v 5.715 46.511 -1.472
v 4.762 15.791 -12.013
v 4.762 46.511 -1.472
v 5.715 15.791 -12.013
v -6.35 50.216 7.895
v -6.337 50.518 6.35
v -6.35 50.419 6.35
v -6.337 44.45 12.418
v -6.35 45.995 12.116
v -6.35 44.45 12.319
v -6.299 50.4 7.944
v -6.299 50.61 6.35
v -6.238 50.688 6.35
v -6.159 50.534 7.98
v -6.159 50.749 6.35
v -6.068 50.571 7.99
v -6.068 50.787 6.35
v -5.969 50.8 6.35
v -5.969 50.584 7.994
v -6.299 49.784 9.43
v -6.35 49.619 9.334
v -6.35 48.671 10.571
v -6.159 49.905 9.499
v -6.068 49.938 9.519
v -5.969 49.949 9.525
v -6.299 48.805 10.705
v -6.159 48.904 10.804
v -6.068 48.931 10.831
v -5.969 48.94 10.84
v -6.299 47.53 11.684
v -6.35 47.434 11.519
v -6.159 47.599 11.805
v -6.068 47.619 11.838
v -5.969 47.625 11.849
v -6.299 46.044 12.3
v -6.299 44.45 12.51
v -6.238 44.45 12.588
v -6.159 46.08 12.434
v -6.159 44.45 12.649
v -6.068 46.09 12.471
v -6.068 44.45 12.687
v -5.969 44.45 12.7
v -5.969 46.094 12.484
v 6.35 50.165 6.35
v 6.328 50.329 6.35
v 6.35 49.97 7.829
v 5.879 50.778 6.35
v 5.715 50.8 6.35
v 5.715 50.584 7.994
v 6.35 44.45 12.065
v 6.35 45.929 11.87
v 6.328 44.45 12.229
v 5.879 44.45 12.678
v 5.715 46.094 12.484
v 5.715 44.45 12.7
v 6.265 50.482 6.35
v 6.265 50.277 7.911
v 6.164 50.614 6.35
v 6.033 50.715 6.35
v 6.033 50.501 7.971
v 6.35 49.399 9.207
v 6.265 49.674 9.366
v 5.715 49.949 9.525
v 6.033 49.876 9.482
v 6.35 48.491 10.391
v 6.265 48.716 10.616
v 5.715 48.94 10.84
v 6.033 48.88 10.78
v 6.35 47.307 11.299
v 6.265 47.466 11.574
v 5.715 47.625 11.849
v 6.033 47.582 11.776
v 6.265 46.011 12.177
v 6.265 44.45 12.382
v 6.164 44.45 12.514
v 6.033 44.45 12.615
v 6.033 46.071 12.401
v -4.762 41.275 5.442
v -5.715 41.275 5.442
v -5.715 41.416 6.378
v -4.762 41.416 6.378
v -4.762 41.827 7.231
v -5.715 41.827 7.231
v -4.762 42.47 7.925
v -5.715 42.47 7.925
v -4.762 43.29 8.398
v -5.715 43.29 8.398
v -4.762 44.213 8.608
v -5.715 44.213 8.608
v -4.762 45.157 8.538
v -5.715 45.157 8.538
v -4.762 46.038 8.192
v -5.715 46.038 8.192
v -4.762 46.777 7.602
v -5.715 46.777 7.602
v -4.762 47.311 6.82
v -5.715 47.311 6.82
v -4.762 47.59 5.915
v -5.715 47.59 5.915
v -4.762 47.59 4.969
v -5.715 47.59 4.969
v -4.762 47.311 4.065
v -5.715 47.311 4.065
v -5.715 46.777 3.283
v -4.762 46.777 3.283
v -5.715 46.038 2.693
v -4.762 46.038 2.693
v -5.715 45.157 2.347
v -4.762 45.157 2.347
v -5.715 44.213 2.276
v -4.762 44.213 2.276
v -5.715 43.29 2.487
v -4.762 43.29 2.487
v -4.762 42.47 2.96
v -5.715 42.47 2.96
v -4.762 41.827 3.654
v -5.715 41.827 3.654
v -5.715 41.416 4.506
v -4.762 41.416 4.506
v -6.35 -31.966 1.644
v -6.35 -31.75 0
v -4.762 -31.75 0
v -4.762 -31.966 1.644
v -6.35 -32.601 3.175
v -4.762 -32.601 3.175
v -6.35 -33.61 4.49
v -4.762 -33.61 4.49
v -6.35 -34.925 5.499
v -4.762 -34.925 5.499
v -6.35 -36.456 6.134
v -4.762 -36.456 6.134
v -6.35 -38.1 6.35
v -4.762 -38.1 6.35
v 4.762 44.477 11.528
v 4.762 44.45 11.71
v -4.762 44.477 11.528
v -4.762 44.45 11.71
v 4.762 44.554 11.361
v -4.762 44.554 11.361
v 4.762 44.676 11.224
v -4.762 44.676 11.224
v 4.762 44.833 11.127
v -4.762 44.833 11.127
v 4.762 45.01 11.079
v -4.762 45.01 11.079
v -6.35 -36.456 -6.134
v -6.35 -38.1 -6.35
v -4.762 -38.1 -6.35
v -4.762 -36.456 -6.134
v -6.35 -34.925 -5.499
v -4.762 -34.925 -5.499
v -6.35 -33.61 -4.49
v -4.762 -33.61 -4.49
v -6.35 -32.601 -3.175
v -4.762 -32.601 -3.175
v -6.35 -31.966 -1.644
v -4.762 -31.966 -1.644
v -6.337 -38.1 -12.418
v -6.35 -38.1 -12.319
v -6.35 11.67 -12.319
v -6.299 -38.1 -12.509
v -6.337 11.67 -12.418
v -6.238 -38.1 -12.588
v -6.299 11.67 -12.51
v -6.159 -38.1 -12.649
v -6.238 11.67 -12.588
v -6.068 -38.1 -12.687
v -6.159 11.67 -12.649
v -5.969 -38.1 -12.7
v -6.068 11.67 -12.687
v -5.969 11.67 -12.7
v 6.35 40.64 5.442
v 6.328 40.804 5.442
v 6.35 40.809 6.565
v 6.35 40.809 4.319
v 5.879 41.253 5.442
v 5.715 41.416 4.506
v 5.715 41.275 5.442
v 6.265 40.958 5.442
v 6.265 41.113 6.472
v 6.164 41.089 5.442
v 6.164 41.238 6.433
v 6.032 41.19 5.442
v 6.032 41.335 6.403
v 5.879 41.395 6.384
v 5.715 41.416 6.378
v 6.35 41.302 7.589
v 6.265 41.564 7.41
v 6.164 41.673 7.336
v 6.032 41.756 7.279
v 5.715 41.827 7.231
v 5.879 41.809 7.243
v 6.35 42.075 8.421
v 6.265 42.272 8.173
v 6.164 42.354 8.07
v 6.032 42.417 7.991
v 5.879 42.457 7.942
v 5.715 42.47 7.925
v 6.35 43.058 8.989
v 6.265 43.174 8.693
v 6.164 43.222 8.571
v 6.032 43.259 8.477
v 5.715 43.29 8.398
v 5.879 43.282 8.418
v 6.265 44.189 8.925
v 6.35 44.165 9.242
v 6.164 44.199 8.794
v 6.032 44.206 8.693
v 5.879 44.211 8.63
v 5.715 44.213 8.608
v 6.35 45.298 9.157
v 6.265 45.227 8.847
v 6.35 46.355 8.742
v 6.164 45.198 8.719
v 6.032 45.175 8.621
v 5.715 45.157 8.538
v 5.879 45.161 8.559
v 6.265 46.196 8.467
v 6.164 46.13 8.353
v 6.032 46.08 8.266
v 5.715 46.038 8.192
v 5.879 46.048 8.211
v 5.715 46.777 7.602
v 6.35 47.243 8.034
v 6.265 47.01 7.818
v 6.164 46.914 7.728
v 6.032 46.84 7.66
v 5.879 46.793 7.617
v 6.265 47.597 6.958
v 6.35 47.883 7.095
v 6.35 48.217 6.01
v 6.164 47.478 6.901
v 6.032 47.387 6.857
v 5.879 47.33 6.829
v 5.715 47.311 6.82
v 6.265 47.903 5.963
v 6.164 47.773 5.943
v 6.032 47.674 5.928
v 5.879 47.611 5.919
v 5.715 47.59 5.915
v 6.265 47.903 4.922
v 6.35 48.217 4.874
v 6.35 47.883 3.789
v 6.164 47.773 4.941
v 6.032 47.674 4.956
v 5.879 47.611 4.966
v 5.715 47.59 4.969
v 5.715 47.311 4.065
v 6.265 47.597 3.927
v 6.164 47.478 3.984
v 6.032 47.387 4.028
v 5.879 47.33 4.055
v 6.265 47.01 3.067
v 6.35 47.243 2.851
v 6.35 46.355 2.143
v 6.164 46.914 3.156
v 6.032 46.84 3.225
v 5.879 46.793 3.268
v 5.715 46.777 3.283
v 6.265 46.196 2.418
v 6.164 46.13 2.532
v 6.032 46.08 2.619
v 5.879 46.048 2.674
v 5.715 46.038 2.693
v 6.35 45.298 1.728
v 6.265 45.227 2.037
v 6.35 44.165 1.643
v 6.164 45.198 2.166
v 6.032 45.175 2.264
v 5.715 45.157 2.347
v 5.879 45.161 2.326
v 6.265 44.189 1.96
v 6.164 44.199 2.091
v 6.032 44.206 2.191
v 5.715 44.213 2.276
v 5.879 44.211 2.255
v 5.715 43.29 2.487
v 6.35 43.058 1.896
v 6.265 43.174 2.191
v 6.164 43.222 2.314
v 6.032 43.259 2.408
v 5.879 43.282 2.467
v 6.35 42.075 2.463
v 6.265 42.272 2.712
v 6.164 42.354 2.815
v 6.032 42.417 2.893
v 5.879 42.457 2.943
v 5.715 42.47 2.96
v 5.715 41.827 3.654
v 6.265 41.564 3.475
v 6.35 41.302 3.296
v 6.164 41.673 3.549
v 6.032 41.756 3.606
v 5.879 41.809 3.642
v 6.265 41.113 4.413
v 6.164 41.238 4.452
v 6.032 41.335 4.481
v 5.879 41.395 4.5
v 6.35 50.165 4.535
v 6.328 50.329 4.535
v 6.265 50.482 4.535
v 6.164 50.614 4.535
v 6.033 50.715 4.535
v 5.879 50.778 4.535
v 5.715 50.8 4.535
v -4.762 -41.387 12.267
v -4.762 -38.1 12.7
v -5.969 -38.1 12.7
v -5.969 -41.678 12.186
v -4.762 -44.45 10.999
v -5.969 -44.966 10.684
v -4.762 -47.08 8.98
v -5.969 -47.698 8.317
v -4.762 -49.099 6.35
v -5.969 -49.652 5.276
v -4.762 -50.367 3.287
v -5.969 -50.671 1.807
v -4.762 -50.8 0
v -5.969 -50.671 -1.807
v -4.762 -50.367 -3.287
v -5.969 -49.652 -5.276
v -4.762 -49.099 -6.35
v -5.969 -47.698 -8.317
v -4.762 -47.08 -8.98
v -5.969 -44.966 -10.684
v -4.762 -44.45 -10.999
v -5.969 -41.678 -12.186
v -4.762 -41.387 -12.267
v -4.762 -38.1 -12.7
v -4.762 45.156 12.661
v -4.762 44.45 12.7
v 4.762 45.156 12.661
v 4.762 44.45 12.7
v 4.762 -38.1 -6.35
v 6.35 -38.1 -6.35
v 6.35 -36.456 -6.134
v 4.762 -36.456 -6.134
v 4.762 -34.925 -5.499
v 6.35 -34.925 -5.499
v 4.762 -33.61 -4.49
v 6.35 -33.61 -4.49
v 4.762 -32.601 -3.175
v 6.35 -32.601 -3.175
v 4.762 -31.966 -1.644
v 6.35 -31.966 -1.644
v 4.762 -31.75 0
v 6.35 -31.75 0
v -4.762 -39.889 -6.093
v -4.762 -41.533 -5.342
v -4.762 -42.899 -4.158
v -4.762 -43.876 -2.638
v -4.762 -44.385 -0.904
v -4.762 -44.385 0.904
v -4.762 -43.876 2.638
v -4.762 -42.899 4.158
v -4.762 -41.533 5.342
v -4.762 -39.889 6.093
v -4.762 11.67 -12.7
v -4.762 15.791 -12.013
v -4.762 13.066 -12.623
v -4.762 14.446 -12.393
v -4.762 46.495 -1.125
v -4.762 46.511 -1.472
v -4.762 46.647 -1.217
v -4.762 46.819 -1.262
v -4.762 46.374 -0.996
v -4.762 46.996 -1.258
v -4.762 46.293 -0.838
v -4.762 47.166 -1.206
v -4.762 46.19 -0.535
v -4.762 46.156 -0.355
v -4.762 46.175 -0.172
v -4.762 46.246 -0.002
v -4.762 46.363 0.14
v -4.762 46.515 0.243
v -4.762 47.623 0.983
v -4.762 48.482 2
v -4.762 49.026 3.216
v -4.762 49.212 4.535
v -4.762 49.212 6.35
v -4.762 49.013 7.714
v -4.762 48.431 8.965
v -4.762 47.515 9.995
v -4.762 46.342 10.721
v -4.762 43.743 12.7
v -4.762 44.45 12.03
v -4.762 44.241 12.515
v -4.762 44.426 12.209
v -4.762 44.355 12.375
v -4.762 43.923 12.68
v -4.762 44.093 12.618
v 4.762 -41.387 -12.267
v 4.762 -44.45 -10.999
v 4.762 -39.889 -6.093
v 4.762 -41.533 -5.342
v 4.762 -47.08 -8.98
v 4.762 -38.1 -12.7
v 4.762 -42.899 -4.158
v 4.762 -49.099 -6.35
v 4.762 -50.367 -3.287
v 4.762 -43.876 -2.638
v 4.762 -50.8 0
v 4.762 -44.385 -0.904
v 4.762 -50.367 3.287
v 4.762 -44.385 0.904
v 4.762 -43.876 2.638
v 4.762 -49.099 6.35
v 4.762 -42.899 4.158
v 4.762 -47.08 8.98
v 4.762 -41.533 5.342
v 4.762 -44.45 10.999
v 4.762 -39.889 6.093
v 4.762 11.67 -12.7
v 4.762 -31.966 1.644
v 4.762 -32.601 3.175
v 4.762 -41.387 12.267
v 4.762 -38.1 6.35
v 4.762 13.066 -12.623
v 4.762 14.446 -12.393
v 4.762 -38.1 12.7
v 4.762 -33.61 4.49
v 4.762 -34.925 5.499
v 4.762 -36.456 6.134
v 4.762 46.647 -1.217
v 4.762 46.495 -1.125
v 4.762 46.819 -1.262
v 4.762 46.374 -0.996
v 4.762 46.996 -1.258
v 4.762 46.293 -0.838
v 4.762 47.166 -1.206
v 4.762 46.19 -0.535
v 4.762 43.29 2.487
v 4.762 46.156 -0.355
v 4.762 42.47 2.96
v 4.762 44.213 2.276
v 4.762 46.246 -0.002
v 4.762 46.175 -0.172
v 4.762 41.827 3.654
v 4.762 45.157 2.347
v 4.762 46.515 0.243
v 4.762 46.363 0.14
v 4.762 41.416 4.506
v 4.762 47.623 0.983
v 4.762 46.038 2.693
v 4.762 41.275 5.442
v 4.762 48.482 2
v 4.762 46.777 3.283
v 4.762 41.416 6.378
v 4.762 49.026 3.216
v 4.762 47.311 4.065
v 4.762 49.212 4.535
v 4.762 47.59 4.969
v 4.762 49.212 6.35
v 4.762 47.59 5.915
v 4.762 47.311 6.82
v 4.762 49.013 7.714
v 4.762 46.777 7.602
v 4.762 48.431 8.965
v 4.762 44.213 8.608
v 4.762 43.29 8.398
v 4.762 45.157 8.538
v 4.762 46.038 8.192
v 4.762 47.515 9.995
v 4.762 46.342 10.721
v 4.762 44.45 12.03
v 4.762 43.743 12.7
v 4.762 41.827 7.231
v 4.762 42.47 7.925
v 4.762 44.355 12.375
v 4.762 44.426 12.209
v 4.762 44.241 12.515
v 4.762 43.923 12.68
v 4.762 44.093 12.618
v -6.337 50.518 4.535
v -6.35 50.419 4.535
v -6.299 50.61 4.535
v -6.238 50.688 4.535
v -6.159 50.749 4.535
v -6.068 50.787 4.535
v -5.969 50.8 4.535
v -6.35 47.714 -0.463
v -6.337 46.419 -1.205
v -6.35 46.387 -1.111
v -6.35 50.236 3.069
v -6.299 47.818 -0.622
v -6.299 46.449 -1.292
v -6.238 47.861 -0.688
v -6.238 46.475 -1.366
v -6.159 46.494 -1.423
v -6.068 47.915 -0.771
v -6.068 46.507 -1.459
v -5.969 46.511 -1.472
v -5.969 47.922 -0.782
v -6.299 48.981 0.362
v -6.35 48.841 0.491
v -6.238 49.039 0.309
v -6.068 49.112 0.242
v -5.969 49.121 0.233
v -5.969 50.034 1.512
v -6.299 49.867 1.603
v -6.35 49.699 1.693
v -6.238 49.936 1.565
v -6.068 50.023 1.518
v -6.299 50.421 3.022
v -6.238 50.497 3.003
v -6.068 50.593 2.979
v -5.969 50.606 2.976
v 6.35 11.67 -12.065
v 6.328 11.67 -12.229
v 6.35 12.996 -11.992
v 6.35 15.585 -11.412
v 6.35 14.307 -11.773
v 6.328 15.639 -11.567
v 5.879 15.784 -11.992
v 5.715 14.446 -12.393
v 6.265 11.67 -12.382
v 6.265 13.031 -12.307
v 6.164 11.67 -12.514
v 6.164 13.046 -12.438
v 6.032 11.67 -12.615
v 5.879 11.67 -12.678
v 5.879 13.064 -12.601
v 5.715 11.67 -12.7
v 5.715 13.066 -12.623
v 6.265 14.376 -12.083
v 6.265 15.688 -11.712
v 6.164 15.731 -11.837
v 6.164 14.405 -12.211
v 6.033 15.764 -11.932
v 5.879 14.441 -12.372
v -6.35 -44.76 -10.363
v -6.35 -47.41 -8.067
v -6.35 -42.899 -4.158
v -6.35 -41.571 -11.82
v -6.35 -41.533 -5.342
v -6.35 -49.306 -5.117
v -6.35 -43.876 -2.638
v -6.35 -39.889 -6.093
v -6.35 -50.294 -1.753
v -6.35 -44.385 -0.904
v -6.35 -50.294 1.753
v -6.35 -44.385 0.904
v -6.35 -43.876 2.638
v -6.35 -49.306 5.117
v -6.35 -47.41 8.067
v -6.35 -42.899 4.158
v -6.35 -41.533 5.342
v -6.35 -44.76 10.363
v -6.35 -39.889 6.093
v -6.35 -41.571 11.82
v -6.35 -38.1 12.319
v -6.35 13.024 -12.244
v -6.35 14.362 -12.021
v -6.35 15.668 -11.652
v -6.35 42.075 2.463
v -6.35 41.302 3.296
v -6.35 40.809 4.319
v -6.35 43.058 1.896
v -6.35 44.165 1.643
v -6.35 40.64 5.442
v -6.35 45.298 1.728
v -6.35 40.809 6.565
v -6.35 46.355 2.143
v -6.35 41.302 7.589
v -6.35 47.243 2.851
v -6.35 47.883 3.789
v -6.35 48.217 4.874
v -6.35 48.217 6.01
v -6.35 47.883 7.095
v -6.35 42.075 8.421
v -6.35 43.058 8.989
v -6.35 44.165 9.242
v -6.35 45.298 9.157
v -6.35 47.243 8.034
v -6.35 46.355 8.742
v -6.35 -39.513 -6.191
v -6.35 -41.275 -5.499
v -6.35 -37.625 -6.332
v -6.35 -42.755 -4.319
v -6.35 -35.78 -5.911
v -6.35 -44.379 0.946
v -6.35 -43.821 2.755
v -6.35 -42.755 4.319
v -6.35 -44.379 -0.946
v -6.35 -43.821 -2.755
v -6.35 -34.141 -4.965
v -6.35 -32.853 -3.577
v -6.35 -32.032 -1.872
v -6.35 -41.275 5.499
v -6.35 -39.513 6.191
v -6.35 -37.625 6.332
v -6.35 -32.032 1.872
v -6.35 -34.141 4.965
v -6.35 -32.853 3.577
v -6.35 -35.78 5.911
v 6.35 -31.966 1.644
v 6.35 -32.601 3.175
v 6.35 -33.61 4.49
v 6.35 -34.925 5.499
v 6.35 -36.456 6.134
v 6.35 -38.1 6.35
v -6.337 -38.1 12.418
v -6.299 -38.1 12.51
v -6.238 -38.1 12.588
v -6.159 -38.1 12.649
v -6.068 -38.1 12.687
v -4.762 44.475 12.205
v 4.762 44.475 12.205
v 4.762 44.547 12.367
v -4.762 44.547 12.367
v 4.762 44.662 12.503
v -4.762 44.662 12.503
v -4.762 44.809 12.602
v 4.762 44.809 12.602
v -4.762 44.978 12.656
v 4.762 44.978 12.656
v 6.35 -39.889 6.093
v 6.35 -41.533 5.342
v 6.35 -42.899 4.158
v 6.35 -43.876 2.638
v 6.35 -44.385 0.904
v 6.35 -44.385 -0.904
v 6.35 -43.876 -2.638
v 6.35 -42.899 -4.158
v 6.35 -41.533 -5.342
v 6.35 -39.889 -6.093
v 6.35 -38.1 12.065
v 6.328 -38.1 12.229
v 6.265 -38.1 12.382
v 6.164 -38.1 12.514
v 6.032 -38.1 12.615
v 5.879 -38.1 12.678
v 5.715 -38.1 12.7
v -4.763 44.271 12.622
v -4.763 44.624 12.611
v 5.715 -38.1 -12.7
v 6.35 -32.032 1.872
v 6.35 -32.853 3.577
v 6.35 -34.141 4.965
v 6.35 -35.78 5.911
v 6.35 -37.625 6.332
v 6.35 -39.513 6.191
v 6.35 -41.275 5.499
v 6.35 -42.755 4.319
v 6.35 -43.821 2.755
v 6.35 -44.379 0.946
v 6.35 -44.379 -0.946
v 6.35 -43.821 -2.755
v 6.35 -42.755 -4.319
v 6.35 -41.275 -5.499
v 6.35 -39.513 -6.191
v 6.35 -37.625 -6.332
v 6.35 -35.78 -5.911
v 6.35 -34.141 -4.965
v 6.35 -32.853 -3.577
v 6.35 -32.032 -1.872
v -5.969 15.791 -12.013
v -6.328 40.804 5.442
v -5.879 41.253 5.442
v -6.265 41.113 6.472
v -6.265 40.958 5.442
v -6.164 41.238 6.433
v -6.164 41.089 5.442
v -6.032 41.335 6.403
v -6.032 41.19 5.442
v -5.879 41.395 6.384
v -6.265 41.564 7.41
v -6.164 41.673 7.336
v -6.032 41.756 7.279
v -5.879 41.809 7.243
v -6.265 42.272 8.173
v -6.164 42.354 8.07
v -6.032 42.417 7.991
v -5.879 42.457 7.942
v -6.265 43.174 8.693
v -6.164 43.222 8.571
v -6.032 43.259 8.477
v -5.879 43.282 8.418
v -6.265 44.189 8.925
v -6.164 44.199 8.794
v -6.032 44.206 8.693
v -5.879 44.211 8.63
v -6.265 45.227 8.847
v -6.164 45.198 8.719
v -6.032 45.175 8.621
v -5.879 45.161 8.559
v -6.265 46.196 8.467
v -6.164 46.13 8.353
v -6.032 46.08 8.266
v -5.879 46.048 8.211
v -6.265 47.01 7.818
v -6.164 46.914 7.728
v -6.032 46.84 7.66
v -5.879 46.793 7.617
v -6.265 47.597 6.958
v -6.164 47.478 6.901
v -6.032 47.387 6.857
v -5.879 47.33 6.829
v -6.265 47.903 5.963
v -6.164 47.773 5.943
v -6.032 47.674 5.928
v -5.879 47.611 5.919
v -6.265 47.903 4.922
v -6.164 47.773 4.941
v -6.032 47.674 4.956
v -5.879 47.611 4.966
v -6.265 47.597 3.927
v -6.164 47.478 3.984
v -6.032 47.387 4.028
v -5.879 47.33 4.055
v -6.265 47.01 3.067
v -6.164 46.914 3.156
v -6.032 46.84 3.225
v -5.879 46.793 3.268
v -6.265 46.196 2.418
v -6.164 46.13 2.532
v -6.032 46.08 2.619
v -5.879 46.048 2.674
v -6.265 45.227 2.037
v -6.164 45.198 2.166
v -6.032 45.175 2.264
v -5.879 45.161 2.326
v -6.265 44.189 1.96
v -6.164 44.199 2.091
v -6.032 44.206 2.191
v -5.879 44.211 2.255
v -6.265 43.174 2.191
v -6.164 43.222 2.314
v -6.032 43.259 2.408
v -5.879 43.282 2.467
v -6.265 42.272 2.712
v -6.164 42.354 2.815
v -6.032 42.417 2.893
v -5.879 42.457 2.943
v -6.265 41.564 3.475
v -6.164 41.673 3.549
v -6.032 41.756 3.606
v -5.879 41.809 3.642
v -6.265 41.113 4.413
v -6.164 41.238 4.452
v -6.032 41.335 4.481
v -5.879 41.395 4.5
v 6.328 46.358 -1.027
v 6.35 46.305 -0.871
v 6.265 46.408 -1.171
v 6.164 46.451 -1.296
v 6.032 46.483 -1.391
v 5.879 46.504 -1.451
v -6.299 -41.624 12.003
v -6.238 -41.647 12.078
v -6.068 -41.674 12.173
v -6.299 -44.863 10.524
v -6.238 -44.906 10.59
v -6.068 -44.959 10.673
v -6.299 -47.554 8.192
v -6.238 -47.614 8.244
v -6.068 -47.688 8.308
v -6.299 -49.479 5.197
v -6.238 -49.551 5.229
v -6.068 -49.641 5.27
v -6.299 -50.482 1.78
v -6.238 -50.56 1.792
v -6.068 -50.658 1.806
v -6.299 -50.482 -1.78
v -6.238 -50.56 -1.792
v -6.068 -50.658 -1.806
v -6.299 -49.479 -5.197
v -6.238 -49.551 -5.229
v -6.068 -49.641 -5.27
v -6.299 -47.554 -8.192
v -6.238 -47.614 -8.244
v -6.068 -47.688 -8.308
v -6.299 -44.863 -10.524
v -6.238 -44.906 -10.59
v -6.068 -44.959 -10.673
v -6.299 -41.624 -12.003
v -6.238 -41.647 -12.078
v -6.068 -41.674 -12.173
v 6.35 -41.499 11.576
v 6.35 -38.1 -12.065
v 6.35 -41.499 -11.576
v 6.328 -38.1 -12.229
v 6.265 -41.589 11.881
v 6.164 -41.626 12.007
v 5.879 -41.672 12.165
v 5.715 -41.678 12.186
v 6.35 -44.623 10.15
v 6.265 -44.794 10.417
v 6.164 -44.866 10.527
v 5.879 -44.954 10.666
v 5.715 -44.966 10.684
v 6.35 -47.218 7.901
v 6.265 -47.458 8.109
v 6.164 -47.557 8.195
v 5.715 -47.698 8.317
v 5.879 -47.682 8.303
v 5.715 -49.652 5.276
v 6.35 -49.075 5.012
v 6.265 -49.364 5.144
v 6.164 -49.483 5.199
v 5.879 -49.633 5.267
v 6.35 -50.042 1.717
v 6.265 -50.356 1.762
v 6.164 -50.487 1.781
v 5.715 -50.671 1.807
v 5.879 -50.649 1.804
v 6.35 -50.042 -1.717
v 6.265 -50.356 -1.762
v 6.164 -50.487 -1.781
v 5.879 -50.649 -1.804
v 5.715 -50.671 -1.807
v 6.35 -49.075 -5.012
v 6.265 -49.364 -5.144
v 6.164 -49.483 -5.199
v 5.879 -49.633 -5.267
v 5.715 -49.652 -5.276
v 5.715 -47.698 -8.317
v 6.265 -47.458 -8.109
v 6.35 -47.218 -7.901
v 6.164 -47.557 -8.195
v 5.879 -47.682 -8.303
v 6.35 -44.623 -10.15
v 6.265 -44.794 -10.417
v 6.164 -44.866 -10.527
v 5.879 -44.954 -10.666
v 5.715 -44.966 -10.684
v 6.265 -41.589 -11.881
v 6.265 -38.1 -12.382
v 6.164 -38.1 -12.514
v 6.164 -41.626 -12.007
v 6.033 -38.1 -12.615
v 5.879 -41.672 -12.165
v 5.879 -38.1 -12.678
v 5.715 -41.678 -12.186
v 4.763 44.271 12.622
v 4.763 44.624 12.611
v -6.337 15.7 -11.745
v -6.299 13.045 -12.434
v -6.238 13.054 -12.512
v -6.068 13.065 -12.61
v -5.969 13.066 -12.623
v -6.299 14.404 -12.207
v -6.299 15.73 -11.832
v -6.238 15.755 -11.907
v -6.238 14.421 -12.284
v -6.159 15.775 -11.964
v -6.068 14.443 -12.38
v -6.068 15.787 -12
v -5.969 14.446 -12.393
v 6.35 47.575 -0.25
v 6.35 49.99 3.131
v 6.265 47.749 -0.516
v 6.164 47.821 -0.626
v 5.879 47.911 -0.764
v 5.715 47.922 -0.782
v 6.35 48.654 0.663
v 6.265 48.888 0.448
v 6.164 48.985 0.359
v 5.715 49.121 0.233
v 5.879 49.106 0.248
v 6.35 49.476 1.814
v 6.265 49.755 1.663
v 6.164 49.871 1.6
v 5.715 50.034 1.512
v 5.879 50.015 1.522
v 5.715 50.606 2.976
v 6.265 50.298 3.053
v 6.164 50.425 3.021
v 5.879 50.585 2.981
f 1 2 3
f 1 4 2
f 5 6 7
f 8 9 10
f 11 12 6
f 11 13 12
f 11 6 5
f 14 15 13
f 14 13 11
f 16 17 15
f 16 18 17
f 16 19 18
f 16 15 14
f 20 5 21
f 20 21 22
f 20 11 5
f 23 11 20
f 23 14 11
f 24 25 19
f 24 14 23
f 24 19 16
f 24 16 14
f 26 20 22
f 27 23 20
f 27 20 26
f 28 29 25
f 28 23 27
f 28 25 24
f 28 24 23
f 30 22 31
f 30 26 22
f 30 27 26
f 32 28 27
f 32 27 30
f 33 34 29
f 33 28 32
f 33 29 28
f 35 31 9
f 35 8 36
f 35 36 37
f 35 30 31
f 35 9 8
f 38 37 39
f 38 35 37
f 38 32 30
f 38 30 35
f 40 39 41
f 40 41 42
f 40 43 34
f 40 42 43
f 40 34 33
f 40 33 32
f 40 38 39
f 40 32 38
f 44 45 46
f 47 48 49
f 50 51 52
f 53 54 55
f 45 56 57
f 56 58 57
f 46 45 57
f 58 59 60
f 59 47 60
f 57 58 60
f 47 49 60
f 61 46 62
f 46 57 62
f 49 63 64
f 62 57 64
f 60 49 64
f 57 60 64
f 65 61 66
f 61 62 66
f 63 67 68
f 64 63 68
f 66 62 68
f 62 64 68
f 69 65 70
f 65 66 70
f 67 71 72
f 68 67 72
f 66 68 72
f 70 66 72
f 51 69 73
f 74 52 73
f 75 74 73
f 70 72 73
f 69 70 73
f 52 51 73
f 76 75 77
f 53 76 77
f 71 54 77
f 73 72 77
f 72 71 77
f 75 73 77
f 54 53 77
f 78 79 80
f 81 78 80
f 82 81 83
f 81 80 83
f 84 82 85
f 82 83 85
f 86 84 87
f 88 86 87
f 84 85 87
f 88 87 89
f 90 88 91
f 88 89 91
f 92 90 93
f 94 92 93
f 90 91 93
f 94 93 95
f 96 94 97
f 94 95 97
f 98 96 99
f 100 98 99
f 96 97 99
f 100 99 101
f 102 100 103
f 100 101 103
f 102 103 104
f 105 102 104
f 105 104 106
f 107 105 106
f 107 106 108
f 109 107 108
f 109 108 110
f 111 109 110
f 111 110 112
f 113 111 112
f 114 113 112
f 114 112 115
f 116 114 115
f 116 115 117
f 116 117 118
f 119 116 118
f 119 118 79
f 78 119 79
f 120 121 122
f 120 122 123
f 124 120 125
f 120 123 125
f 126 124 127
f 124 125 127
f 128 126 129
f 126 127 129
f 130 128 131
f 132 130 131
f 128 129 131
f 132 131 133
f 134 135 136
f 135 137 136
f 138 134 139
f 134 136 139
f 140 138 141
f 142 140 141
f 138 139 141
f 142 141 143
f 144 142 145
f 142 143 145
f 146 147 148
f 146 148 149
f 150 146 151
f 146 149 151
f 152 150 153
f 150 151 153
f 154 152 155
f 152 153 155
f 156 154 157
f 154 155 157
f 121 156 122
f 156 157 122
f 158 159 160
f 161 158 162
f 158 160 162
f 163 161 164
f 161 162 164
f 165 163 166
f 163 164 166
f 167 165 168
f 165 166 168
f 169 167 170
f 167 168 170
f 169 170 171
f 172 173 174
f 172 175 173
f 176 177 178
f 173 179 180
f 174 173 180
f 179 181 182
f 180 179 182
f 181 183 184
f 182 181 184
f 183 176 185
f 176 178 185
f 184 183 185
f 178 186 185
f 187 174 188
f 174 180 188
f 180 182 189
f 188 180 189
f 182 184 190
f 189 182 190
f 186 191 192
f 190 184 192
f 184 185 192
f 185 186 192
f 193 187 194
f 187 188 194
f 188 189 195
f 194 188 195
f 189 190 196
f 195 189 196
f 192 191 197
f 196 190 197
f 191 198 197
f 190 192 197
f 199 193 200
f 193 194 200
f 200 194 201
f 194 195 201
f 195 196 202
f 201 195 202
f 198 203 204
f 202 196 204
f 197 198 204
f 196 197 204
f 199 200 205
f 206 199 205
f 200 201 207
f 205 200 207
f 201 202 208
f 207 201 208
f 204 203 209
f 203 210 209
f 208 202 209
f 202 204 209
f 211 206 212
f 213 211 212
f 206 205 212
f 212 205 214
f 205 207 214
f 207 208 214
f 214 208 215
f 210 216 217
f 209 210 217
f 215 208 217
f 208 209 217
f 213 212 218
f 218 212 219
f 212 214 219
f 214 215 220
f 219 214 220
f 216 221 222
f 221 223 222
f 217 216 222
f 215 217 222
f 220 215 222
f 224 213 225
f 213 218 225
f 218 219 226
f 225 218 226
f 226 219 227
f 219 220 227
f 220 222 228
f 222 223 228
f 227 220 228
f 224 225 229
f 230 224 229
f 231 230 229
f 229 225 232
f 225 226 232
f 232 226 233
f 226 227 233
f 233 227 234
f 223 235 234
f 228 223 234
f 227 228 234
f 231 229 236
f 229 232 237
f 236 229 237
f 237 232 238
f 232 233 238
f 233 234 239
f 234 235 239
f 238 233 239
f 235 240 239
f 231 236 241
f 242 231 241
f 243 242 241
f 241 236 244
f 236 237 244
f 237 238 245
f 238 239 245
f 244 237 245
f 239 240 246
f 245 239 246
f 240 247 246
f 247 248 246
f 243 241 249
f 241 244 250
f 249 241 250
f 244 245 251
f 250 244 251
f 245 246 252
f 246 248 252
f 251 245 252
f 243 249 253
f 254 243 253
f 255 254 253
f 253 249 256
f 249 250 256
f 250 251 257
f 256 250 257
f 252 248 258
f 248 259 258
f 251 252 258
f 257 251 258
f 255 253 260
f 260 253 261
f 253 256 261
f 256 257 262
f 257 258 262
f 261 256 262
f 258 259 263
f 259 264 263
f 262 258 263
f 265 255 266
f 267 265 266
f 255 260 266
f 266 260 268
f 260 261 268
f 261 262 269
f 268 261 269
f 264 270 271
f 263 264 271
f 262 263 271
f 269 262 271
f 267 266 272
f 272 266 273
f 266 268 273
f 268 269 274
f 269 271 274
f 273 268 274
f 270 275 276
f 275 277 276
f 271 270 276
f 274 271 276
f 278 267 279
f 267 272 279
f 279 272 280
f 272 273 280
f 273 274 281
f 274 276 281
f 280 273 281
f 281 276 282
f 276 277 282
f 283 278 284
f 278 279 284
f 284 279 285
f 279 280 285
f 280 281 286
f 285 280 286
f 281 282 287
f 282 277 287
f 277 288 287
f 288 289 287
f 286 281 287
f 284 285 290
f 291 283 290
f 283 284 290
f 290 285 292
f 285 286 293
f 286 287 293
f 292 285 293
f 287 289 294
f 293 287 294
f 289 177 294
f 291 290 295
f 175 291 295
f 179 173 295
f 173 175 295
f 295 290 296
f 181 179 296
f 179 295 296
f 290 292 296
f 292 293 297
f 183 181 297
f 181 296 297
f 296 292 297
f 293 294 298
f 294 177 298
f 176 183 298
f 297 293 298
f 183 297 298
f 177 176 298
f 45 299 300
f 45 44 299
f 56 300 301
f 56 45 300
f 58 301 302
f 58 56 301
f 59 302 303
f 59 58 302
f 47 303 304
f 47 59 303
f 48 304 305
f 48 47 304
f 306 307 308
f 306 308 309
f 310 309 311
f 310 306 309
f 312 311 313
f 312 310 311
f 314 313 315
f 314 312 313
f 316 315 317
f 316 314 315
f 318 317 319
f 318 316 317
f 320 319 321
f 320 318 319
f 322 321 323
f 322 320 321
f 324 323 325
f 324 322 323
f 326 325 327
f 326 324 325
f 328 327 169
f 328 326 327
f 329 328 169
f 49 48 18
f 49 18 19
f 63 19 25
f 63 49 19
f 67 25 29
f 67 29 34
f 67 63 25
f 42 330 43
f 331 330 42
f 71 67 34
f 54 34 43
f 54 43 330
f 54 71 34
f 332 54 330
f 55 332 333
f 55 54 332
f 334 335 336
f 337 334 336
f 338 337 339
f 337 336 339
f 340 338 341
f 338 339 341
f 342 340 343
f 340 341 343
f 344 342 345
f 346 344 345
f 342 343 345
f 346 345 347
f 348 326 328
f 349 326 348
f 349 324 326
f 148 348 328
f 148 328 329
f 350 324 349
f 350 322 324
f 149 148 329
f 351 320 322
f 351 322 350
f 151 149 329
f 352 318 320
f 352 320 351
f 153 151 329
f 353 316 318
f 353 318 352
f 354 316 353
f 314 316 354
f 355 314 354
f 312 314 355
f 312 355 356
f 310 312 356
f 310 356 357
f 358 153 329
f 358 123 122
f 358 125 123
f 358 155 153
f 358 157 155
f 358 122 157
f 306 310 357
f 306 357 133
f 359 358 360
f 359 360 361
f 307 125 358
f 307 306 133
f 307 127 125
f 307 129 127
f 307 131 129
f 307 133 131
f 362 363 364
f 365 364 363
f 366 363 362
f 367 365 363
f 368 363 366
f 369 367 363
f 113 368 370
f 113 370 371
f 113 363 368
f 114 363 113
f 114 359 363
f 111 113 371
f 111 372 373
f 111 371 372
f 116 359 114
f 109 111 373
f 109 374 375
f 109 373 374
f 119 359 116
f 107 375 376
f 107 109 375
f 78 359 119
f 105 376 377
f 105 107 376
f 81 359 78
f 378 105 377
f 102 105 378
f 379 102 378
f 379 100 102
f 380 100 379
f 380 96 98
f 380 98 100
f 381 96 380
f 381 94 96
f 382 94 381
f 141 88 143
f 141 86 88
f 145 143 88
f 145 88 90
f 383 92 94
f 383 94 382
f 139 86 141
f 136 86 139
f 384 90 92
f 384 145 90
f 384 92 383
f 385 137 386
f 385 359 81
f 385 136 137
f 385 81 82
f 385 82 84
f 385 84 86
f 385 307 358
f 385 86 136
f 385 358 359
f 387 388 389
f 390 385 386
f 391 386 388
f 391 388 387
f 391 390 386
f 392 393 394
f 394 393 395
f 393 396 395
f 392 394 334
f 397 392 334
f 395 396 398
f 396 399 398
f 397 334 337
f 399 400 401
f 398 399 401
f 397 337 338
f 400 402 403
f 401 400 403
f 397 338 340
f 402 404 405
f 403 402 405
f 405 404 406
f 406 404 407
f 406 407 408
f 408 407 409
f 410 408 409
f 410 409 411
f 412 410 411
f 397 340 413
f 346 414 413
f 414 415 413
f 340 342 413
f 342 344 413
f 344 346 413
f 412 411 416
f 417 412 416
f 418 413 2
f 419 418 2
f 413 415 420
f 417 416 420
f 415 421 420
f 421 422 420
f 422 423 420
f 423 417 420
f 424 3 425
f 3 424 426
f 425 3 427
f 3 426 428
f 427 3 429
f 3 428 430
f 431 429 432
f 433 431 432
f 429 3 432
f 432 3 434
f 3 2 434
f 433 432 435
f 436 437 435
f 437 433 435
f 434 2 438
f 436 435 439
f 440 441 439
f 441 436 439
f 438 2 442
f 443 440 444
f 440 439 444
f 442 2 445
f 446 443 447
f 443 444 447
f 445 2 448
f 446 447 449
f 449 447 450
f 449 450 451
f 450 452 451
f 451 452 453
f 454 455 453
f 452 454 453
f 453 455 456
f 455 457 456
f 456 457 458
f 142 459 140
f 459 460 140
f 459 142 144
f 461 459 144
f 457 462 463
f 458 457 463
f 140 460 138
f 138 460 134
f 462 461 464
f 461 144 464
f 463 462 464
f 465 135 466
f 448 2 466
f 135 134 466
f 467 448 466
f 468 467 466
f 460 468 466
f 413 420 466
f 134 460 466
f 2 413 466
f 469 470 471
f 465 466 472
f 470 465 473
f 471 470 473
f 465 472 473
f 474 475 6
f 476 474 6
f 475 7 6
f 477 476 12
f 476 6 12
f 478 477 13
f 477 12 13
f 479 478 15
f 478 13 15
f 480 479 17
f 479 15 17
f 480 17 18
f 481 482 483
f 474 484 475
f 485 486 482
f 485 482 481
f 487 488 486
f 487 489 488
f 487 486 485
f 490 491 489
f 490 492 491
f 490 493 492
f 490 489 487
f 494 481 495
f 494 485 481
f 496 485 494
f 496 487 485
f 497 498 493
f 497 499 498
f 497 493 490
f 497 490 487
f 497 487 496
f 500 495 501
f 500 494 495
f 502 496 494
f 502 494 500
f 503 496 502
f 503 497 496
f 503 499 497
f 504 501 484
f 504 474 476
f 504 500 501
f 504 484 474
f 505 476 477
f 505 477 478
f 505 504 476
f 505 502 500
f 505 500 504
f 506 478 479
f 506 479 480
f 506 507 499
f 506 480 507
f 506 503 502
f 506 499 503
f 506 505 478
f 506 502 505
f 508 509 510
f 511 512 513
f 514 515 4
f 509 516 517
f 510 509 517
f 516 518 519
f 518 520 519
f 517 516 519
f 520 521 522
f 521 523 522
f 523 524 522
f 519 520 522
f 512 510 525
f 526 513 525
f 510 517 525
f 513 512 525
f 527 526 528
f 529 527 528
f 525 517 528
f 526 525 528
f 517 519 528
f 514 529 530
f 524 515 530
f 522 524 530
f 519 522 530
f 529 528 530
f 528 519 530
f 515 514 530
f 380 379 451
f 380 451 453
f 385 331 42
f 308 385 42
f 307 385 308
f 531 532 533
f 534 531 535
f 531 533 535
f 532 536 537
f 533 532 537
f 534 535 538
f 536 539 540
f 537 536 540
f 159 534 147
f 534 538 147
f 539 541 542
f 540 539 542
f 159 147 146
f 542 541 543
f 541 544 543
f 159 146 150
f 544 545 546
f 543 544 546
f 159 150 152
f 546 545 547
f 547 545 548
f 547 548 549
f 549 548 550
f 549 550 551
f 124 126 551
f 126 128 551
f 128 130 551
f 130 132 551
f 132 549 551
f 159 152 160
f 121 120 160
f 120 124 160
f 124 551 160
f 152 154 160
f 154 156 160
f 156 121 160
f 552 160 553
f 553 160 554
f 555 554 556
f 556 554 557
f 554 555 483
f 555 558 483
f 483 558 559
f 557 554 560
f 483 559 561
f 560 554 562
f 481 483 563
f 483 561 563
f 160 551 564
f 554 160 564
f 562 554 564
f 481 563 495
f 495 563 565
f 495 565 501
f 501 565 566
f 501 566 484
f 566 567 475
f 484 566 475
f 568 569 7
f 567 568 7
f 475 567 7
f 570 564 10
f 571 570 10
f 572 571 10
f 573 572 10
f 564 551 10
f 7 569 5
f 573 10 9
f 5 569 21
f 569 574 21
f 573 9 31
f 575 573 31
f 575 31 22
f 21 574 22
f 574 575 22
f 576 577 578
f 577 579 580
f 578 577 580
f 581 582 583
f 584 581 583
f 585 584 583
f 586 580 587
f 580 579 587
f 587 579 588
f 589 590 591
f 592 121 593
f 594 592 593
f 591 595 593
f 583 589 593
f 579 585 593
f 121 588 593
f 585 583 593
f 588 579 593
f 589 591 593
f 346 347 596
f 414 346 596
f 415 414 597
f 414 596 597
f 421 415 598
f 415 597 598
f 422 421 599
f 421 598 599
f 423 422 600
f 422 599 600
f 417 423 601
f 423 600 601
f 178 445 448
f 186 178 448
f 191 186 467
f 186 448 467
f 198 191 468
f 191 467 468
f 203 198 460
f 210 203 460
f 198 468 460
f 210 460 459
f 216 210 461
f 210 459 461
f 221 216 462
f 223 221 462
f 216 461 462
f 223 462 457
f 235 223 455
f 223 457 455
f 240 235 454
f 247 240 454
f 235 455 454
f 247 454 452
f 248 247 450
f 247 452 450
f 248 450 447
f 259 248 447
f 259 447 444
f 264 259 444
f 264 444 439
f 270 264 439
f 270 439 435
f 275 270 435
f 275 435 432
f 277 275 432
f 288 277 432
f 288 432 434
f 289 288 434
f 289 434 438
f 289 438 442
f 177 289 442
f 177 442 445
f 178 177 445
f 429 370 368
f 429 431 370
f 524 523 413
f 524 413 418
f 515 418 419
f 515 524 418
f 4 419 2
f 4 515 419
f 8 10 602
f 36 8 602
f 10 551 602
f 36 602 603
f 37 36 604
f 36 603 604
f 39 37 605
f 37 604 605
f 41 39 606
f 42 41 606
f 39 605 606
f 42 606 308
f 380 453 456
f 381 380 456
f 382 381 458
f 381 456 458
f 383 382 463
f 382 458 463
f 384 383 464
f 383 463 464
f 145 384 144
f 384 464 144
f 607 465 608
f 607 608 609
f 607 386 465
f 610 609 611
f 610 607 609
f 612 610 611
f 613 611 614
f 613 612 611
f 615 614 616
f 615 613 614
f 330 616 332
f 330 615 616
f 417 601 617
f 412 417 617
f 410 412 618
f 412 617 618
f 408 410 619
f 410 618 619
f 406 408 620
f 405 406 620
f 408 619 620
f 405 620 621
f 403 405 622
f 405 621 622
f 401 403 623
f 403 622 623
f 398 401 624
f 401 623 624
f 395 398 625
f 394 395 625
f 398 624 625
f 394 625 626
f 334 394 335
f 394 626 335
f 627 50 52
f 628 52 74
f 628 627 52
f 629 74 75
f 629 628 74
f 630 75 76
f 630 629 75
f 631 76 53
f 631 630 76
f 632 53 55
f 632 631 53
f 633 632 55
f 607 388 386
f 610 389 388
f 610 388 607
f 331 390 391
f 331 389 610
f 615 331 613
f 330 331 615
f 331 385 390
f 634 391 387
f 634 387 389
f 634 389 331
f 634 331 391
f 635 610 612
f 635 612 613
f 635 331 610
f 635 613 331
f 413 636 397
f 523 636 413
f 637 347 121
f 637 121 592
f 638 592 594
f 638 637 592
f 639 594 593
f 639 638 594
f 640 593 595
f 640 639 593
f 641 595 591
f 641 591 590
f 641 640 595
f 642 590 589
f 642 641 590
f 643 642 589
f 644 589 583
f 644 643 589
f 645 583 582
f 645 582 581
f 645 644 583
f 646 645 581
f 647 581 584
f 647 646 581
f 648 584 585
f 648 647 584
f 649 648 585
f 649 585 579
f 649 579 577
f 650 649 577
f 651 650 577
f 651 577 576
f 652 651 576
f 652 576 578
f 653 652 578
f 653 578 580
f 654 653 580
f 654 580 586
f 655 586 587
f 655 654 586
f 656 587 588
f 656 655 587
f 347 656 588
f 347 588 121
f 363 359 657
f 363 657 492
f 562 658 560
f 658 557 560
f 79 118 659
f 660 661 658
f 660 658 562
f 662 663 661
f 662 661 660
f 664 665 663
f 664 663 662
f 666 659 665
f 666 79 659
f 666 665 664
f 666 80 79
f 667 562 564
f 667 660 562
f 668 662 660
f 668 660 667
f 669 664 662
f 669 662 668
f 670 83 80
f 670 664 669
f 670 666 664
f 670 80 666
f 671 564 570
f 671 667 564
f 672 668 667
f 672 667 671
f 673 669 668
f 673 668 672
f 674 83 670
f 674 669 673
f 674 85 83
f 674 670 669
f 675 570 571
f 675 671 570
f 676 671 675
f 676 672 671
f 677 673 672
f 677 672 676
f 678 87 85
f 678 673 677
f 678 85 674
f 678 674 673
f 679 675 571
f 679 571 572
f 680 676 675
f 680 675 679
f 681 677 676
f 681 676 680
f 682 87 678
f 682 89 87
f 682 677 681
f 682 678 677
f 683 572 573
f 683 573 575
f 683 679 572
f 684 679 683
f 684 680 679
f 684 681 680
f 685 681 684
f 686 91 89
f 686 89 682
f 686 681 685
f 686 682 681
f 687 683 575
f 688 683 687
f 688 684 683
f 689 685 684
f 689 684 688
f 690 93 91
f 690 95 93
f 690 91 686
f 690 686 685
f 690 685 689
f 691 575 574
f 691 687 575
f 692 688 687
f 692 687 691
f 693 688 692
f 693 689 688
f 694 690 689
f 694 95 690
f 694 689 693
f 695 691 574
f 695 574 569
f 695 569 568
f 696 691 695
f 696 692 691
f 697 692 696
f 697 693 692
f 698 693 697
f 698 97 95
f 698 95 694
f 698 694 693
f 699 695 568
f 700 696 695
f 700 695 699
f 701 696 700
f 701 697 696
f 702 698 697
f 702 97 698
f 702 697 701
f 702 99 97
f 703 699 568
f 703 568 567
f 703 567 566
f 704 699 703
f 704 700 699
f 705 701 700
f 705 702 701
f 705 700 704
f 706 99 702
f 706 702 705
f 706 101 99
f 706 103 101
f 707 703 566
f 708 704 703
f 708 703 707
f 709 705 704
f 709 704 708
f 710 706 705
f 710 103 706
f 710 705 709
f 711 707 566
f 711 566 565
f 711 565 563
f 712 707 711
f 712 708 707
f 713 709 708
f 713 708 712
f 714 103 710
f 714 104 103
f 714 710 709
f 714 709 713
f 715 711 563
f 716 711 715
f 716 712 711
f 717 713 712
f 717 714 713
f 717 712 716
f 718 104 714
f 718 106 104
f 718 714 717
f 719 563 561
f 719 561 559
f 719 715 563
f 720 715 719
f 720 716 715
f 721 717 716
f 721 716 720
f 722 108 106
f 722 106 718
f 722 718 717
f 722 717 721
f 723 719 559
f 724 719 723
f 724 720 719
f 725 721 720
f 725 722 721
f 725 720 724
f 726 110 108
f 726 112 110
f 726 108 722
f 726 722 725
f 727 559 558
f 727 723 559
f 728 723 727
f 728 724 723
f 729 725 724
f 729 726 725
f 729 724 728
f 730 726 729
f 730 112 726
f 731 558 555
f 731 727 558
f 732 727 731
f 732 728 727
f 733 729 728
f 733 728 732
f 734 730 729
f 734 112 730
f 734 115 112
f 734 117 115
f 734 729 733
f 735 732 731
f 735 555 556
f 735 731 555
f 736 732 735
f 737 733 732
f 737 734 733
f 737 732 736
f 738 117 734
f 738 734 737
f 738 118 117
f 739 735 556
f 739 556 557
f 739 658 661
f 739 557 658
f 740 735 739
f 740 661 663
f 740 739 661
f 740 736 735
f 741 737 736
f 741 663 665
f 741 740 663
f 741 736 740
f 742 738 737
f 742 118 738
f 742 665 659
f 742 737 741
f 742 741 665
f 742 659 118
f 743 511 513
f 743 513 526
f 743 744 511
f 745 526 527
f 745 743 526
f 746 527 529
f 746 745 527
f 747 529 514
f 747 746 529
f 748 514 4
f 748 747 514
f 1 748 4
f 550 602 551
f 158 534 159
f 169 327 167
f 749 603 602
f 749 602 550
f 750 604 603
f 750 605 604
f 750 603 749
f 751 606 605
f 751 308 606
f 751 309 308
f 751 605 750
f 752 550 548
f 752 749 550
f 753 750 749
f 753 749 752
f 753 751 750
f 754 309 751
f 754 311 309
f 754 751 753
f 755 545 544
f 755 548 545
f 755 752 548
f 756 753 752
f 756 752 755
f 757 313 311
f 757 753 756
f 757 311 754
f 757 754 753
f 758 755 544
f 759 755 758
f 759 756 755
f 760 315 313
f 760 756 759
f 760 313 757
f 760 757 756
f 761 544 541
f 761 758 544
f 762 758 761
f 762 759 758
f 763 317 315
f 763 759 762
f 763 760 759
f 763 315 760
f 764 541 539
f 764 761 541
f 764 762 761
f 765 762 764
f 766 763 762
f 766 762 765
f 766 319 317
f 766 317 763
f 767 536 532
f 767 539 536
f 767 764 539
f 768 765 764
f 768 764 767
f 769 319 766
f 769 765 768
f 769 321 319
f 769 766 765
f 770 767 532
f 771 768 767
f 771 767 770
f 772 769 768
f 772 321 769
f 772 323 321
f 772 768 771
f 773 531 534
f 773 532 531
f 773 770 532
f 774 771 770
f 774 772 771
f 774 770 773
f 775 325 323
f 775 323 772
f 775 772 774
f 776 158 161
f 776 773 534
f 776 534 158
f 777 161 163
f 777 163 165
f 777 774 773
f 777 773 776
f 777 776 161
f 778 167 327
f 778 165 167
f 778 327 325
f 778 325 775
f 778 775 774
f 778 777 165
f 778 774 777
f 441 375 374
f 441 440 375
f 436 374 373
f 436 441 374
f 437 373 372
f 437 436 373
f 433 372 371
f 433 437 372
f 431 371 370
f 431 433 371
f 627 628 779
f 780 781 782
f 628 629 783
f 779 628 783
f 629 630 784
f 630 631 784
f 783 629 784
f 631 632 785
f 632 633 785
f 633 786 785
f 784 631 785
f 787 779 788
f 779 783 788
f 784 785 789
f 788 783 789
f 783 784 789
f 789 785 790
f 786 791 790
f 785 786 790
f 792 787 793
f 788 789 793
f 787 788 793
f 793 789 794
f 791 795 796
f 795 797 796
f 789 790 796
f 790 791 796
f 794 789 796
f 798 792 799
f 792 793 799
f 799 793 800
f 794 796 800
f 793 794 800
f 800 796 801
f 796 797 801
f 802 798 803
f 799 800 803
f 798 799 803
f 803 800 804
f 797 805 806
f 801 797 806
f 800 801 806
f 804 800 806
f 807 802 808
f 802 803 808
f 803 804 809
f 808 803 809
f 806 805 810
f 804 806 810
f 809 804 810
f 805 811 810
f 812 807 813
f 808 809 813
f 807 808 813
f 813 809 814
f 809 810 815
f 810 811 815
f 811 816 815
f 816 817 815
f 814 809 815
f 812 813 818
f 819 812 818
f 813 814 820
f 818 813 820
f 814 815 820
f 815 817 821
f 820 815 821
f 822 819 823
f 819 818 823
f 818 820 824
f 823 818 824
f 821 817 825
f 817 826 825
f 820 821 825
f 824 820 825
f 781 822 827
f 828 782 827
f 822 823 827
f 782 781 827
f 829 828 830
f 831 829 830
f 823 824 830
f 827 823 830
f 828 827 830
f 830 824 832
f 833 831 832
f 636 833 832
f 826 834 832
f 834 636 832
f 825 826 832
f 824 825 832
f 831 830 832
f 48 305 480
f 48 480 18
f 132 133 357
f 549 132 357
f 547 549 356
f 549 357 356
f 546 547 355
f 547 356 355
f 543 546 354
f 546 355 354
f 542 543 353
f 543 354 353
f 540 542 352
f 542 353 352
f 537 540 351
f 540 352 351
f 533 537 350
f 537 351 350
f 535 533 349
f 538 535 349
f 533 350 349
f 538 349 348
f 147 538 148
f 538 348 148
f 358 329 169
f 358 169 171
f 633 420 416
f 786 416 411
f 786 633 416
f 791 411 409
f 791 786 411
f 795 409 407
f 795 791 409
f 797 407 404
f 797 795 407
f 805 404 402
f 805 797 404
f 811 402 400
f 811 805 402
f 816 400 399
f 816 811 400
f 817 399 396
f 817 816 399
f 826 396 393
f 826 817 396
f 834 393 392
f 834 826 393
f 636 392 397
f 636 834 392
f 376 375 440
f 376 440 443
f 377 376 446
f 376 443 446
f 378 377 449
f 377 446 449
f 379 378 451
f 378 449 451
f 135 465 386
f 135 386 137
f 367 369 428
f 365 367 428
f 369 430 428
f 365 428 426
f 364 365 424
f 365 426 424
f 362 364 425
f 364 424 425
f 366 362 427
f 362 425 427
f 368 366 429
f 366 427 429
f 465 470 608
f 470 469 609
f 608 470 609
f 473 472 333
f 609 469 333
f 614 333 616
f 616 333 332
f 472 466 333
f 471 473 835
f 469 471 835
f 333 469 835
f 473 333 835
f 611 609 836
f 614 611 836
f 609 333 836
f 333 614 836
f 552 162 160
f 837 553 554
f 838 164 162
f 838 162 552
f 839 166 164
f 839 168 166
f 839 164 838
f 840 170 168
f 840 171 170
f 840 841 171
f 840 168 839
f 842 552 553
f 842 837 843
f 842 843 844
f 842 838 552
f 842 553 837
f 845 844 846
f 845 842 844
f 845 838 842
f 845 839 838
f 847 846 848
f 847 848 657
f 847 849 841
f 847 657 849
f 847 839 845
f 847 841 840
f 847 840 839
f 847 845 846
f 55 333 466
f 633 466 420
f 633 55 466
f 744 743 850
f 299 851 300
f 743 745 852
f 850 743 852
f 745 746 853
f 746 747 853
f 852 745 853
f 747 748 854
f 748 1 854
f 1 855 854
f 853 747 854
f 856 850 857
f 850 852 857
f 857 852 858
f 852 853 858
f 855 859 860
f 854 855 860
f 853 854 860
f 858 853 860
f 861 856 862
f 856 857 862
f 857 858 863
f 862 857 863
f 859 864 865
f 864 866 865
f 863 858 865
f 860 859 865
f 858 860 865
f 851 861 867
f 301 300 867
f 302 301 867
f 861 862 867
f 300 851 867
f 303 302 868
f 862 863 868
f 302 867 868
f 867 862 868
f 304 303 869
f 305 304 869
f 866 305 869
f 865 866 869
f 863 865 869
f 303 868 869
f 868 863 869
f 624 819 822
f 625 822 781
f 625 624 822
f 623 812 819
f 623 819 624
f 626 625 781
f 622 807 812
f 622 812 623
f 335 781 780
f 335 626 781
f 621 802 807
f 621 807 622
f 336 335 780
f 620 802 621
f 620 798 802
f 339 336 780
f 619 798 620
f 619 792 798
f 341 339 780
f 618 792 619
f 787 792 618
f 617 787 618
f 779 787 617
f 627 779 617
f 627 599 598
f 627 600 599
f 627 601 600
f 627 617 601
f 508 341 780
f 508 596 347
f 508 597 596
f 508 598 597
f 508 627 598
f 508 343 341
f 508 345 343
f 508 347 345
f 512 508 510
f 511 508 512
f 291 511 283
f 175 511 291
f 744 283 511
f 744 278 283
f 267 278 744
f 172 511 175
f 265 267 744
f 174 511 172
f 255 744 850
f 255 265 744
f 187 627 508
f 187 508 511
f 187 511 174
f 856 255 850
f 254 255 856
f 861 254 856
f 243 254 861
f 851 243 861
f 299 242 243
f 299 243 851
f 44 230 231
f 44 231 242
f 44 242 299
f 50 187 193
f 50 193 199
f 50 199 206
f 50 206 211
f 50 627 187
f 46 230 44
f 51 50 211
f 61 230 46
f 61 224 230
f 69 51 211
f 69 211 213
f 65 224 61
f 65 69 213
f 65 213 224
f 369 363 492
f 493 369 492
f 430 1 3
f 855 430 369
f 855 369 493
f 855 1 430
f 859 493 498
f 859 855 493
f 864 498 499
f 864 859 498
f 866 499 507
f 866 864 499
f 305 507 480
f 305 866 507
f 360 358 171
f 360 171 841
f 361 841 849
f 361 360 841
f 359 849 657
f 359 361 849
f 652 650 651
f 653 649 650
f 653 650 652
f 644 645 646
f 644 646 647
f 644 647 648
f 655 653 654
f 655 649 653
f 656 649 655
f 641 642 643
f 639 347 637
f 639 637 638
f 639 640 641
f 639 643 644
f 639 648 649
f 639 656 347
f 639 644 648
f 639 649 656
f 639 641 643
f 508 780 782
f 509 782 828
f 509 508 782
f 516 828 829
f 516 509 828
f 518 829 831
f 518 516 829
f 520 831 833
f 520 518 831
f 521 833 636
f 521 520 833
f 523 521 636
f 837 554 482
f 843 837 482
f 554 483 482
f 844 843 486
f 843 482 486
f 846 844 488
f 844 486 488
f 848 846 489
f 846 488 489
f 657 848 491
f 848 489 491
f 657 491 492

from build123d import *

# Parameters (mm, degrees)
F1_DEPTH  = 6.35
F2_T      = 1.5875
F3_R      = 3.175
F4_DEPTH  = 25.4
F5_R      = 0.635
F6_R      = 0.381
F7_F1_R   = 0.635
F7_F2_R   = 0.635
F7_F3_R   = 0.635
F7_F4_R   = 0.635
F7_F5_R   = 0.635
F9_DEPTH  = 25.4
F10_R     = 6.35
F11_DEPTH = 12.7


# Not quite as in the source:
# - a shell that OpenCascade refuses in one call is made with other operations: the cavity is built on its own and cut out


with BuildPart() as f1:
    # F0 (on Right) → F1 (new body, symmetric)
    with BuildSketch(Plane.YZ):
        with BuildLine():
            ThreePointArc((-38.1, 12.7), (-47.0802561211, 8.9802561211), (-50.8, 0))
            ThreePointArc((-50.8, 0), (-47.0802561211, -8.9802561211), (-38.1, -12.7))
            Line((-38.1, -12.7), (11.6695368579, -12.7))
            ThreePointArc((11.6695368579, -12.7), (13.7589335903, -12.5269478044), (15.7913894262, -12.0125072905))
            Line((15.7913894262, -12.0125072905), (46.5109262841, -1.4717102003))
            ThreePointArc((46.5109262841, -1.4717102003), (49.617658169, 0.8443118739), (50.8, 4.5345434449))
            Line((50.8, 4.5345434449), (50.8, 6.35))
            ThreePointArc((50.8, 6.35), (48.9401280605, 10.8401280605), (44.45, 12.7))
            Line((44.45, 12.7), (-38.1, 12.7))
        make_face()
    extrude(amount=F1_DEPTH, both=True)

    # F2: shell of thickness 1.5875, made by hand


with BuildPart() as f2_core1:
    # F2_t2: copy of F1
    add(f1.part)

    # the walls: a layer under each face that stays
    f2_faces = [f2_core1.faces().sort_by_distance(p)[0] for p in [
        (0, 48.9401280605, 10.8401280605),
        (0, 50.8, 5.4422717225),
        (0, 49.617658169, 0.8443118739),
        (6.35, 0, 0),
        (-6.35, 0, 0),
    ]]
    thicken(f2_faces, amount=-F2_T, mode=Mode.SUBTRACT)


with BuildPart() as f1_1:
    add(f1.part)

    # what is left inside the walls is the cavity
    f2_cavity = [f2_core1.part.solids().sort_by_distance(p)[0] for p in [
        (4.746625, -0.79375, -4.233333),
    ]]
    add(f2_cavity, mode=Mode.SUBTRACT)

    # F3 (on face) → F4 (cut)
    with BuildSketch(Plane(origin=(-6.35, 0, 0), x_dir=(0, -1, 0), z_dir=(-1, 0, 0))):
        with Locations((-44.45, 5.4422717225)):
            Circle(F3_R)
    extrude(amount=-F4_DEPTH, mode=Mode.SUBTRACT)

    # F5
    f5_edges = [f1_1.edges().sort_by_distance(p)[0] for p in [
        (-6.35, 47.625, 5.442272),
        (6.35, 47.625, 5.442272),
    ]]
    fillet(f5_edges, radius=F5_R)

    # F6
    f6_edges = [f1_1.edges().sort_by_distance(p)[0] for p in [
        (-6.35, 48.26, 5.442272),
        (-6.35, 3.175, 12.7),
        (-6.35, 48.940128, 10.840128),
        (-6.35, -50.8, 0),
        (-6.35, 50.8, 5.442272),
        (-6.35, -13.215232, -12.7),
        (-6.35, 49.617658, 0.844312),
        (-6.35, 13.758934, -12.526948),
        (-6.35, 31.151158, -6.742109),
    ]]
    fillet(f6_edges, radius=F6_R)

    # F7: fillet of radius 0.635 on 13 edges, made by hand

    # F7_f1
    f7_f1_edges = [f1_1.edges().sort_by_distance(p)[0] for p in [
        (6.35, 48.9401280605, 10.8401280605),
        (6.35, 50.8, 5.4422717225),
        (6.35, 49.617658169, 0.8443118739),
        (6.35, 3.175, 12.7),
        (6.35, -50.8, 0),
        (6.35, -13.215231571, -12.7),
        (6.35, 13.7589335903, -12.5269478044),
        (6.35, 31.1511578552, -6.7421087454),
    ]]
    fillet(f7_f1_edges, radius=F7_F1_R)

    # F7_f2
    f7_f2_edges = [f1_1.edges().sort_by_distance(p)[0] for p in [
        (0, 46.5109262841, -1.4717102003),
    ]]
    fillet(f7_f2_edges, radius=F7_F2_R)

    # F7_f3
    f7_f3_edges = [f1_1.edges().sort_by_distance(p)[0] for p in [
        (0, 44.45, 11.1125),
    ]]
    fillet(f7_f3_edges, radius=F7_F3_R)

    # F7_f4
    f7_f4_edges = [f1_1.edges().sort_by_distance(p)[0] for p in [
        (0, 45.9956947131, 0.029853211),
    ]]
    fillet(f7_f4_edges, radius=F7_F4_R)

    # F7_f5
    f7_f5_edges = [f1_1.edges().sort_by_distance(p)[0] for p in [
        (0, 44.45, 12.7),
    ]]
    fillet(f7_f5_edges, radius=F7_F5_R)

    # F8 (on face) → F9 (cut)
    with BuildSketch(Plane.YZ.offset(6.35)):
        with BuildLine():
            ThreePointArc((-31.75, 0), (-33.6098719395, 4.4901280605), (-38.1, 6.35))
            Line((-38.1, 6.35), (-38.1, -6.35))
            ThreePointArc((-38.1, -6.35), (-33.6098719395, -4.4901280605), (-31.75, 0))
        make_face()
        with BuildLine():
            Line((-38.1, -6.35), (-38.1, 6.35))
            ThreePointArc((-38.1, 6.35), (-44.45, 0), (-38.1, -6.35))
        make_face()
    extrude(amount=-F9_DEPTH, mode=Mode.SUBTRACT)


with BuildPart() as f11:
    # F10 (on face) → F11 (new body)
    with BuildSketch(Plane.YZ.offset(6.35)):
        with Locations((-38.1, 0)):
            Circle(F10_R)
    extrude(amount=-F11_DEPTH)


solid = Compound([f1_1.part, f11.part])
